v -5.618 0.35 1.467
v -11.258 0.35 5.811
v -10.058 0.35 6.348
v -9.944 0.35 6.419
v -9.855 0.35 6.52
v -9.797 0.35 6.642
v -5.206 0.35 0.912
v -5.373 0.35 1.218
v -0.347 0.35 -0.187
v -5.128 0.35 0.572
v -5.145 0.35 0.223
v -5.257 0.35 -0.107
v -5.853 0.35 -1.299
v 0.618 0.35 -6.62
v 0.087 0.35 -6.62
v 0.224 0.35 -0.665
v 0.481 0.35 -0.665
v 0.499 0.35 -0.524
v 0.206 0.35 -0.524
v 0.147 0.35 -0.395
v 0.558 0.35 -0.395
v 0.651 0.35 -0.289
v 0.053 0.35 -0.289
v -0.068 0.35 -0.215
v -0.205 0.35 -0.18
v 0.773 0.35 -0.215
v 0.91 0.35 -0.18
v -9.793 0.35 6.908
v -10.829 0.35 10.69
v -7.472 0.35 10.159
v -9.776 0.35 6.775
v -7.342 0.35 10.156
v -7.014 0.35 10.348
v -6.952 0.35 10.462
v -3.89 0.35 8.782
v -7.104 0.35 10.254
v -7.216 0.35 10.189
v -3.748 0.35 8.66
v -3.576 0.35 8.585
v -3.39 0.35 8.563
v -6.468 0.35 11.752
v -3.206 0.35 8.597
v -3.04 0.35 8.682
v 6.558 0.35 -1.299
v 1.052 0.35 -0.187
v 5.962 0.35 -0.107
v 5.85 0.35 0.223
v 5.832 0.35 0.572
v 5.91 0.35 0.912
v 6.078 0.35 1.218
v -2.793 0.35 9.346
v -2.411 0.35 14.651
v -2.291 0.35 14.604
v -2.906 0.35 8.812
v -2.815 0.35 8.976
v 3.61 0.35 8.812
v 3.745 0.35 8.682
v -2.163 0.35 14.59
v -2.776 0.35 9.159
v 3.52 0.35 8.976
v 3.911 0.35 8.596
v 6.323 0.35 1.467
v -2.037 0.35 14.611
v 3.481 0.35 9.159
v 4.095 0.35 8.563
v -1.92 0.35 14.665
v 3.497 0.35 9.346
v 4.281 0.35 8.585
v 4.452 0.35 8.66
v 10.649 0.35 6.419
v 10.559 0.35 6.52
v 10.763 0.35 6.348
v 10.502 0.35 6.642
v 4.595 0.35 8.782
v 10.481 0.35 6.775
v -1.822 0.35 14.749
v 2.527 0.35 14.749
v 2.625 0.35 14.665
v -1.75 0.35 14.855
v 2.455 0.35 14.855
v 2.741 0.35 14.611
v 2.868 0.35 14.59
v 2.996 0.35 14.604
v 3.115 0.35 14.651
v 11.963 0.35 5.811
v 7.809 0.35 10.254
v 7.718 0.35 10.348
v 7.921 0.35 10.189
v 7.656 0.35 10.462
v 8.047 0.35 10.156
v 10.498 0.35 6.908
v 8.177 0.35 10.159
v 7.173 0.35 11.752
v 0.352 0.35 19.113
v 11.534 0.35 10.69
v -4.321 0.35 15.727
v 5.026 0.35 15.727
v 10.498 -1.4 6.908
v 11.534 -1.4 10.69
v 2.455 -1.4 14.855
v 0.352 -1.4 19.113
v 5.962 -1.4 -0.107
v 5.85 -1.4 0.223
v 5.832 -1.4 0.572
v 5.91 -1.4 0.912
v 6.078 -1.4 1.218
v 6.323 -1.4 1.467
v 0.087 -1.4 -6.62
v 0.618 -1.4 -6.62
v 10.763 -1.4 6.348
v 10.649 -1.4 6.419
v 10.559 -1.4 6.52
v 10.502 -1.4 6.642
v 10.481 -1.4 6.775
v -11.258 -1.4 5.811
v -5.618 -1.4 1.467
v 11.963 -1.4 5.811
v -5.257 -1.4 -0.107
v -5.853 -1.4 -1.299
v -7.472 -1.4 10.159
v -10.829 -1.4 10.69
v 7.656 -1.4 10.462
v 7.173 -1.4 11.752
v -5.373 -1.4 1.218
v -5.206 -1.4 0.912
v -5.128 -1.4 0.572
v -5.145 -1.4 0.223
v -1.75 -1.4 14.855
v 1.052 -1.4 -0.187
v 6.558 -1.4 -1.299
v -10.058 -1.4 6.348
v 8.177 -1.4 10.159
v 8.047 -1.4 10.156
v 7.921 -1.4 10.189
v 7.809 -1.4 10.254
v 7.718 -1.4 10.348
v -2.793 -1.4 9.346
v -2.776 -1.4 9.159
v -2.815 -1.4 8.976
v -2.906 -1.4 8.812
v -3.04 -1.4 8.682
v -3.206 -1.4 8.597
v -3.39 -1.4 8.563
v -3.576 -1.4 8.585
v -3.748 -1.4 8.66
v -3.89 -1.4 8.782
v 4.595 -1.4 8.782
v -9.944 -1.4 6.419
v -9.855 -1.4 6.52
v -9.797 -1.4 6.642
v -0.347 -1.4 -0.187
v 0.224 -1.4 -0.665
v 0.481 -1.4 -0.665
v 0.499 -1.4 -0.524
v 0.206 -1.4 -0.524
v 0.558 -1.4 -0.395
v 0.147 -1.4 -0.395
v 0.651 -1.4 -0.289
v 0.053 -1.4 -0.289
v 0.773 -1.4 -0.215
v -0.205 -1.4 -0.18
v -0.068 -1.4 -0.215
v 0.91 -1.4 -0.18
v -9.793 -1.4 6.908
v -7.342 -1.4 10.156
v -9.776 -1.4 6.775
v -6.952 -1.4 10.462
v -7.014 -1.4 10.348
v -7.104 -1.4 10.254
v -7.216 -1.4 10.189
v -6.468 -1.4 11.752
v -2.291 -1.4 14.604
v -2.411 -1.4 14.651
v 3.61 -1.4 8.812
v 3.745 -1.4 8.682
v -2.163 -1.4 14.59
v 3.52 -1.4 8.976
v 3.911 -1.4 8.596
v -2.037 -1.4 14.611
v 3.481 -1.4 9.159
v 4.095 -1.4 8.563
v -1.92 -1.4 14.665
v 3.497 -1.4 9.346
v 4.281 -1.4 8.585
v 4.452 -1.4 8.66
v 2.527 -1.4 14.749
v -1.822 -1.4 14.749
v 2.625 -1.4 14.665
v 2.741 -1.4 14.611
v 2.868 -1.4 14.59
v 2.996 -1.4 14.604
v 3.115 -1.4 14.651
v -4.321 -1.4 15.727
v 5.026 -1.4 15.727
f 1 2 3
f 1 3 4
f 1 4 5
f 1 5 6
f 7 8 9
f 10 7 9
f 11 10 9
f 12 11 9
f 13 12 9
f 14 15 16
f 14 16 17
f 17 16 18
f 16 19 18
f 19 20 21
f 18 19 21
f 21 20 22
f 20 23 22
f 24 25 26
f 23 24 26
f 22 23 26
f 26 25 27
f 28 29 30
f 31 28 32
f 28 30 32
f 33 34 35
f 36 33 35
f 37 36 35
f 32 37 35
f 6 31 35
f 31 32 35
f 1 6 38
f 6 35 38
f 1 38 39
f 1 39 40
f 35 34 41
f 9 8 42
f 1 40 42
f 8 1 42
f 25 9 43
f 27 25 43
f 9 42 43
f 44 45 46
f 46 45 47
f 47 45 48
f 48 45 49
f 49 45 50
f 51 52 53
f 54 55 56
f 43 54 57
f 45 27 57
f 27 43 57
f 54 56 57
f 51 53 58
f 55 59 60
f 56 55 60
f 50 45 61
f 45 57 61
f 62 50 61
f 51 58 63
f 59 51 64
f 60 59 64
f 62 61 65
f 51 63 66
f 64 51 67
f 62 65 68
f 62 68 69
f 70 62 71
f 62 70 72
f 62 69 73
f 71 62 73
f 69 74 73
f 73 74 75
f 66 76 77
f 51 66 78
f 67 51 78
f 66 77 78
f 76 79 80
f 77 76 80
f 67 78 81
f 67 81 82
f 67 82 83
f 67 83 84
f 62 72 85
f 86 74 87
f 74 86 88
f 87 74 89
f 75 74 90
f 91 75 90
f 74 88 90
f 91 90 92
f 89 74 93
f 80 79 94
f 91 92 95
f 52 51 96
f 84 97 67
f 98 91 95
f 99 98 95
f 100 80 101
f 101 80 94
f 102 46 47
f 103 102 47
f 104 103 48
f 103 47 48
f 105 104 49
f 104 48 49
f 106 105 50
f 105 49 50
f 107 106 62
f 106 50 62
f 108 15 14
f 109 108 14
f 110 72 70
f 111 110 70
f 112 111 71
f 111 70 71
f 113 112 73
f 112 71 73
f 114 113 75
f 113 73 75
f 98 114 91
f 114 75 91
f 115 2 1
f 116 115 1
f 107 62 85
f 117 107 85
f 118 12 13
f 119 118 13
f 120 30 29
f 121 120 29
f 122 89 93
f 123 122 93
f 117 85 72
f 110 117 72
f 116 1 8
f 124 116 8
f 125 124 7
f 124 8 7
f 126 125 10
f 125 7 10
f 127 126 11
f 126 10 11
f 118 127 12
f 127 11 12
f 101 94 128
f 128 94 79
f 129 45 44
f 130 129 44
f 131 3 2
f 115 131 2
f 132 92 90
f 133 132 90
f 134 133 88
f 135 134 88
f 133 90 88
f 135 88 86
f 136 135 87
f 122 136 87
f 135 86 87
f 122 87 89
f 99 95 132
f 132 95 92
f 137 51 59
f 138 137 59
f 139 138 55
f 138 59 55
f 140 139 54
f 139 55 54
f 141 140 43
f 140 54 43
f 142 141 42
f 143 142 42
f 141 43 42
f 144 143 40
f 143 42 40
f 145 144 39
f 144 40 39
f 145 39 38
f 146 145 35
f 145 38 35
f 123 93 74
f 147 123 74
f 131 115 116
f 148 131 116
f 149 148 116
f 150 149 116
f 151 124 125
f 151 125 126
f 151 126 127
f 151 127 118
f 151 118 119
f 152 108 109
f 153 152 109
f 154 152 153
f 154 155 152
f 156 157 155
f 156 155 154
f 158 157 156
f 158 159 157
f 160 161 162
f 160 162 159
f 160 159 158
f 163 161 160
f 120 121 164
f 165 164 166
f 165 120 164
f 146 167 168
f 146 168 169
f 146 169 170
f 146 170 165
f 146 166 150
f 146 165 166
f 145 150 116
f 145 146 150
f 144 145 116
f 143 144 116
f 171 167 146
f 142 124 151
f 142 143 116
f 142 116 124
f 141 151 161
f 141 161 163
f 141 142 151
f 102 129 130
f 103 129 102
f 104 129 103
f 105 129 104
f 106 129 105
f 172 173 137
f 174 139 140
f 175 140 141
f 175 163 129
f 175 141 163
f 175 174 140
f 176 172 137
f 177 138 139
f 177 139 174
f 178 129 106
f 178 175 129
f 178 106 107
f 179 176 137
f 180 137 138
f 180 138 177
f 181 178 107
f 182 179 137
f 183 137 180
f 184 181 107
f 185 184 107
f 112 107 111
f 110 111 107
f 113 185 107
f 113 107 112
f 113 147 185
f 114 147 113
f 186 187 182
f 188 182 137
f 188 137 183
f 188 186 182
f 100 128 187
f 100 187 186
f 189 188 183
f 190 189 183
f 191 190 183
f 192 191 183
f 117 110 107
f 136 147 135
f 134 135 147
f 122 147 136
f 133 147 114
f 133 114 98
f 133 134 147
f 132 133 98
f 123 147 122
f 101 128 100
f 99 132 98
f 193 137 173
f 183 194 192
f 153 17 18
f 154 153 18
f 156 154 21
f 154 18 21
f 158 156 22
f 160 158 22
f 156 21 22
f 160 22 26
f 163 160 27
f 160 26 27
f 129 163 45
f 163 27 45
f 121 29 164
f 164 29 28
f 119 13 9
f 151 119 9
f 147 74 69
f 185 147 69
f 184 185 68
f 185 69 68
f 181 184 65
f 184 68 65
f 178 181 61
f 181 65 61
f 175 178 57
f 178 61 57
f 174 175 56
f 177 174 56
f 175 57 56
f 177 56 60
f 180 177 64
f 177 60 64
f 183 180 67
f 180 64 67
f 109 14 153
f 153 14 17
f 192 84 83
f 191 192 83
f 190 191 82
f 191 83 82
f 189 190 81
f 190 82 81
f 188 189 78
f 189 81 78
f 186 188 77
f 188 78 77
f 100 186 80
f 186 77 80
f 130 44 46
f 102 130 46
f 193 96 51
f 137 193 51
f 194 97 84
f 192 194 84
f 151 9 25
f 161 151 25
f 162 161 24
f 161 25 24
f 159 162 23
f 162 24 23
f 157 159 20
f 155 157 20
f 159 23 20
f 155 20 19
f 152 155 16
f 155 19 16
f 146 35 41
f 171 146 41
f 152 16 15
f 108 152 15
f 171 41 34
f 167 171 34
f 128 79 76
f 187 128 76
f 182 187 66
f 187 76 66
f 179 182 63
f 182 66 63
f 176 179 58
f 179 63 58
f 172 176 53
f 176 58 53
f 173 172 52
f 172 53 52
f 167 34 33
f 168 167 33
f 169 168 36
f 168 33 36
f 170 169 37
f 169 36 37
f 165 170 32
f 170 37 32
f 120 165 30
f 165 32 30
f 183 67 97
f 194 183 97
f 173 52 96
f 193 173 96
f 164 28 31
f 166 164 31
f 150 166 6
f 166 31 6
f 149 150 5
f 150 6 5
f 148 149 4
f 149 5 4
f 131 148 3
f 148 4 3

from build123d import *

# Parameters (mm, degrees)
F1_DEPTH = 1.4
F2_SCALE = 1.25


# Not quite as in the source:
# - ends of sketch curves that miss each other by under 0.0002 mm in the source are joined


with BuildPart() as f1:
    # F0 (on Front) → F1 (new body)
    with BuildSketch(Plane.XZ):
        with BuildLine():
            Line((2.0343041438, 15.7069808039), (0.3523669438, 19.1131970039))
            Line((0.3523669438, 19.1131970039), (0.3523669438, -1.4730457961))
            Line((0.3523669438, -1.4730457961), (0.5645331438, -1.4730457961))
            Line((0.5645331438, -1.4730457961), (0.4553893438, 3.2909274039))
            ThreePointArc((0.4553893438, 3.2909274039), (0.5916556183, 3.5917542423), (0.9117258932, 3.6731219434))
            Line((0.9117258932, 3.6731219434), (5.3169493438, 2.7830798039))
            Line((5.3169493438, 2.7830798039), (4.8399119438, 3.7367228039))
            ThreePointArc((4.8399119438, 3.7367228039), (4.7582554065, 4.4182578922), (5.1286096155, 4.9961801528))
            Line((5.1286096155, 4.9961801528), (9.6409691438, 8.4717908039))
            Line((9.6409691438, 8.4717908039), (8.6805951438, 8.9006952039))
            ThreePointArc((8.6805951438, 8.9006952039), (8.4915257857, 9.0857200238), (8.4685111742, 9.3492575516))
            Line((8.4685111742, 9.3492575516), (9.2975103438, 12.3747294039))
            Line((9.2975103438, 12.3747294039), (6.6119175438, 11.9498382039))
            ThreePointArc((6.6119175438, 11.9498382039), (6.3606002996, 11.996951044), (6.1956594084, 12.1923309026))
            Line((6.1956594084, 12.1923309026), (5.8086171438, 13.2239784039))
            Line((5.8086171438, 13.2239784039), (3.7461117438, 10.8478846039))
            ThreePointArc((3.7461117438, 10.8478846039), (3.1301426273, 10.7291430881), (2.8684469448, 11.2992470593))
            Line((2.8684469448, 11.2992470593), (4.0912977438, 16.4041346039))
            Line((4.0912977438, 16.4041346039), (2.5628527438, 15.5436588039))
            ThreePointArc((2.5628527438, 15.5436588039), (2.2634525656, 15.511644492), (2.0343041438, 15.7069808039))
        make_face()
        with BuildLine():
            Line((0.3523669438, -1.4730457961), (0.3523669438, 19.1131970039))
            Line((0.3523669438, 19.1131970039), (-1.3295956562, 15.7069808039))
            ThreePointArc((-1.3295956562, 15.7069808039), (-1.5587335044, 15.5116477594), (-1.858122509, 15.5436523149))
            Line((-1.858122509, 15.5436523149), (-3.3865892562, 16.4041346039))
            Line((-3.3865892562, 16.4041346039), (-2.1637316562, 11.2992426039))
            ThreePointArc((-2.1637316562, 11.2992426039), (-2.4254367706, 10.7291417351), (-3.0413892842, 10.8478967322))
            Line((-3.0413892842, 10.8478967322), (-5.1039086562, 13.2239784039))
            Line((-5.1039086562, 13.2239784039), (-5.4909284562, 12.1923320039))
            ThreePointArc((-5.4909284562, 12.1923320039), (-5.6558664119, 11.996951044), (-5.9071825723, 11.9498450545))
            Line((-5.9071825723, 11.9498450545), (-8.5927764562, 12.3747294039))
            Line((-8.5927764562, 12.3747294039), (-7.7637966562, 9.3492592039))
            ThreePointArc((-7.7637966562, 9.3492592039), (-7.786817298, 9.0857200238), (-7.9758860019, 8.9006937389))
            Line((-7.9758860019, 8.9006937389), (-8.9362606562, 8.4717908039))
            Line((-8.9362606562, 8.4717908039), (-4.4238744562, 4.9961818039))
            ThreePointArc((-4.4238744562, 4.9961818039), (-4.0535446709, 4.4182480852), (-4.1352063244, 3.7367242387))
            Line((-4.1352063244, 3.7367242387), (-4.6122408562, 2.7830798039))
            Line((-4.6122408562, 2.7830798039), (-0.2070172562, 3.6731212039))
            ThreePointArc((-0.2070172562, 3.6731212039), (0.1130528694, 3.5917542423), (0.2493205388, 3.2909273719))
            Line((0.2493205388, 3.2909273719), (0.1401753438, -1.4730457961))
            Line((0.1401753438, -1.4730457961), (0.3523669438, -1.4730457961))
        make_face()
    extrude(amount=F1_DEPTH)


with BuildPart() as f1_1:
    # F2: moved
    add(f1.part.scale(F2_SCALE).moved(Location((-0.088091736, 0.35, -4.778299251))))


solid = f1_1.part
